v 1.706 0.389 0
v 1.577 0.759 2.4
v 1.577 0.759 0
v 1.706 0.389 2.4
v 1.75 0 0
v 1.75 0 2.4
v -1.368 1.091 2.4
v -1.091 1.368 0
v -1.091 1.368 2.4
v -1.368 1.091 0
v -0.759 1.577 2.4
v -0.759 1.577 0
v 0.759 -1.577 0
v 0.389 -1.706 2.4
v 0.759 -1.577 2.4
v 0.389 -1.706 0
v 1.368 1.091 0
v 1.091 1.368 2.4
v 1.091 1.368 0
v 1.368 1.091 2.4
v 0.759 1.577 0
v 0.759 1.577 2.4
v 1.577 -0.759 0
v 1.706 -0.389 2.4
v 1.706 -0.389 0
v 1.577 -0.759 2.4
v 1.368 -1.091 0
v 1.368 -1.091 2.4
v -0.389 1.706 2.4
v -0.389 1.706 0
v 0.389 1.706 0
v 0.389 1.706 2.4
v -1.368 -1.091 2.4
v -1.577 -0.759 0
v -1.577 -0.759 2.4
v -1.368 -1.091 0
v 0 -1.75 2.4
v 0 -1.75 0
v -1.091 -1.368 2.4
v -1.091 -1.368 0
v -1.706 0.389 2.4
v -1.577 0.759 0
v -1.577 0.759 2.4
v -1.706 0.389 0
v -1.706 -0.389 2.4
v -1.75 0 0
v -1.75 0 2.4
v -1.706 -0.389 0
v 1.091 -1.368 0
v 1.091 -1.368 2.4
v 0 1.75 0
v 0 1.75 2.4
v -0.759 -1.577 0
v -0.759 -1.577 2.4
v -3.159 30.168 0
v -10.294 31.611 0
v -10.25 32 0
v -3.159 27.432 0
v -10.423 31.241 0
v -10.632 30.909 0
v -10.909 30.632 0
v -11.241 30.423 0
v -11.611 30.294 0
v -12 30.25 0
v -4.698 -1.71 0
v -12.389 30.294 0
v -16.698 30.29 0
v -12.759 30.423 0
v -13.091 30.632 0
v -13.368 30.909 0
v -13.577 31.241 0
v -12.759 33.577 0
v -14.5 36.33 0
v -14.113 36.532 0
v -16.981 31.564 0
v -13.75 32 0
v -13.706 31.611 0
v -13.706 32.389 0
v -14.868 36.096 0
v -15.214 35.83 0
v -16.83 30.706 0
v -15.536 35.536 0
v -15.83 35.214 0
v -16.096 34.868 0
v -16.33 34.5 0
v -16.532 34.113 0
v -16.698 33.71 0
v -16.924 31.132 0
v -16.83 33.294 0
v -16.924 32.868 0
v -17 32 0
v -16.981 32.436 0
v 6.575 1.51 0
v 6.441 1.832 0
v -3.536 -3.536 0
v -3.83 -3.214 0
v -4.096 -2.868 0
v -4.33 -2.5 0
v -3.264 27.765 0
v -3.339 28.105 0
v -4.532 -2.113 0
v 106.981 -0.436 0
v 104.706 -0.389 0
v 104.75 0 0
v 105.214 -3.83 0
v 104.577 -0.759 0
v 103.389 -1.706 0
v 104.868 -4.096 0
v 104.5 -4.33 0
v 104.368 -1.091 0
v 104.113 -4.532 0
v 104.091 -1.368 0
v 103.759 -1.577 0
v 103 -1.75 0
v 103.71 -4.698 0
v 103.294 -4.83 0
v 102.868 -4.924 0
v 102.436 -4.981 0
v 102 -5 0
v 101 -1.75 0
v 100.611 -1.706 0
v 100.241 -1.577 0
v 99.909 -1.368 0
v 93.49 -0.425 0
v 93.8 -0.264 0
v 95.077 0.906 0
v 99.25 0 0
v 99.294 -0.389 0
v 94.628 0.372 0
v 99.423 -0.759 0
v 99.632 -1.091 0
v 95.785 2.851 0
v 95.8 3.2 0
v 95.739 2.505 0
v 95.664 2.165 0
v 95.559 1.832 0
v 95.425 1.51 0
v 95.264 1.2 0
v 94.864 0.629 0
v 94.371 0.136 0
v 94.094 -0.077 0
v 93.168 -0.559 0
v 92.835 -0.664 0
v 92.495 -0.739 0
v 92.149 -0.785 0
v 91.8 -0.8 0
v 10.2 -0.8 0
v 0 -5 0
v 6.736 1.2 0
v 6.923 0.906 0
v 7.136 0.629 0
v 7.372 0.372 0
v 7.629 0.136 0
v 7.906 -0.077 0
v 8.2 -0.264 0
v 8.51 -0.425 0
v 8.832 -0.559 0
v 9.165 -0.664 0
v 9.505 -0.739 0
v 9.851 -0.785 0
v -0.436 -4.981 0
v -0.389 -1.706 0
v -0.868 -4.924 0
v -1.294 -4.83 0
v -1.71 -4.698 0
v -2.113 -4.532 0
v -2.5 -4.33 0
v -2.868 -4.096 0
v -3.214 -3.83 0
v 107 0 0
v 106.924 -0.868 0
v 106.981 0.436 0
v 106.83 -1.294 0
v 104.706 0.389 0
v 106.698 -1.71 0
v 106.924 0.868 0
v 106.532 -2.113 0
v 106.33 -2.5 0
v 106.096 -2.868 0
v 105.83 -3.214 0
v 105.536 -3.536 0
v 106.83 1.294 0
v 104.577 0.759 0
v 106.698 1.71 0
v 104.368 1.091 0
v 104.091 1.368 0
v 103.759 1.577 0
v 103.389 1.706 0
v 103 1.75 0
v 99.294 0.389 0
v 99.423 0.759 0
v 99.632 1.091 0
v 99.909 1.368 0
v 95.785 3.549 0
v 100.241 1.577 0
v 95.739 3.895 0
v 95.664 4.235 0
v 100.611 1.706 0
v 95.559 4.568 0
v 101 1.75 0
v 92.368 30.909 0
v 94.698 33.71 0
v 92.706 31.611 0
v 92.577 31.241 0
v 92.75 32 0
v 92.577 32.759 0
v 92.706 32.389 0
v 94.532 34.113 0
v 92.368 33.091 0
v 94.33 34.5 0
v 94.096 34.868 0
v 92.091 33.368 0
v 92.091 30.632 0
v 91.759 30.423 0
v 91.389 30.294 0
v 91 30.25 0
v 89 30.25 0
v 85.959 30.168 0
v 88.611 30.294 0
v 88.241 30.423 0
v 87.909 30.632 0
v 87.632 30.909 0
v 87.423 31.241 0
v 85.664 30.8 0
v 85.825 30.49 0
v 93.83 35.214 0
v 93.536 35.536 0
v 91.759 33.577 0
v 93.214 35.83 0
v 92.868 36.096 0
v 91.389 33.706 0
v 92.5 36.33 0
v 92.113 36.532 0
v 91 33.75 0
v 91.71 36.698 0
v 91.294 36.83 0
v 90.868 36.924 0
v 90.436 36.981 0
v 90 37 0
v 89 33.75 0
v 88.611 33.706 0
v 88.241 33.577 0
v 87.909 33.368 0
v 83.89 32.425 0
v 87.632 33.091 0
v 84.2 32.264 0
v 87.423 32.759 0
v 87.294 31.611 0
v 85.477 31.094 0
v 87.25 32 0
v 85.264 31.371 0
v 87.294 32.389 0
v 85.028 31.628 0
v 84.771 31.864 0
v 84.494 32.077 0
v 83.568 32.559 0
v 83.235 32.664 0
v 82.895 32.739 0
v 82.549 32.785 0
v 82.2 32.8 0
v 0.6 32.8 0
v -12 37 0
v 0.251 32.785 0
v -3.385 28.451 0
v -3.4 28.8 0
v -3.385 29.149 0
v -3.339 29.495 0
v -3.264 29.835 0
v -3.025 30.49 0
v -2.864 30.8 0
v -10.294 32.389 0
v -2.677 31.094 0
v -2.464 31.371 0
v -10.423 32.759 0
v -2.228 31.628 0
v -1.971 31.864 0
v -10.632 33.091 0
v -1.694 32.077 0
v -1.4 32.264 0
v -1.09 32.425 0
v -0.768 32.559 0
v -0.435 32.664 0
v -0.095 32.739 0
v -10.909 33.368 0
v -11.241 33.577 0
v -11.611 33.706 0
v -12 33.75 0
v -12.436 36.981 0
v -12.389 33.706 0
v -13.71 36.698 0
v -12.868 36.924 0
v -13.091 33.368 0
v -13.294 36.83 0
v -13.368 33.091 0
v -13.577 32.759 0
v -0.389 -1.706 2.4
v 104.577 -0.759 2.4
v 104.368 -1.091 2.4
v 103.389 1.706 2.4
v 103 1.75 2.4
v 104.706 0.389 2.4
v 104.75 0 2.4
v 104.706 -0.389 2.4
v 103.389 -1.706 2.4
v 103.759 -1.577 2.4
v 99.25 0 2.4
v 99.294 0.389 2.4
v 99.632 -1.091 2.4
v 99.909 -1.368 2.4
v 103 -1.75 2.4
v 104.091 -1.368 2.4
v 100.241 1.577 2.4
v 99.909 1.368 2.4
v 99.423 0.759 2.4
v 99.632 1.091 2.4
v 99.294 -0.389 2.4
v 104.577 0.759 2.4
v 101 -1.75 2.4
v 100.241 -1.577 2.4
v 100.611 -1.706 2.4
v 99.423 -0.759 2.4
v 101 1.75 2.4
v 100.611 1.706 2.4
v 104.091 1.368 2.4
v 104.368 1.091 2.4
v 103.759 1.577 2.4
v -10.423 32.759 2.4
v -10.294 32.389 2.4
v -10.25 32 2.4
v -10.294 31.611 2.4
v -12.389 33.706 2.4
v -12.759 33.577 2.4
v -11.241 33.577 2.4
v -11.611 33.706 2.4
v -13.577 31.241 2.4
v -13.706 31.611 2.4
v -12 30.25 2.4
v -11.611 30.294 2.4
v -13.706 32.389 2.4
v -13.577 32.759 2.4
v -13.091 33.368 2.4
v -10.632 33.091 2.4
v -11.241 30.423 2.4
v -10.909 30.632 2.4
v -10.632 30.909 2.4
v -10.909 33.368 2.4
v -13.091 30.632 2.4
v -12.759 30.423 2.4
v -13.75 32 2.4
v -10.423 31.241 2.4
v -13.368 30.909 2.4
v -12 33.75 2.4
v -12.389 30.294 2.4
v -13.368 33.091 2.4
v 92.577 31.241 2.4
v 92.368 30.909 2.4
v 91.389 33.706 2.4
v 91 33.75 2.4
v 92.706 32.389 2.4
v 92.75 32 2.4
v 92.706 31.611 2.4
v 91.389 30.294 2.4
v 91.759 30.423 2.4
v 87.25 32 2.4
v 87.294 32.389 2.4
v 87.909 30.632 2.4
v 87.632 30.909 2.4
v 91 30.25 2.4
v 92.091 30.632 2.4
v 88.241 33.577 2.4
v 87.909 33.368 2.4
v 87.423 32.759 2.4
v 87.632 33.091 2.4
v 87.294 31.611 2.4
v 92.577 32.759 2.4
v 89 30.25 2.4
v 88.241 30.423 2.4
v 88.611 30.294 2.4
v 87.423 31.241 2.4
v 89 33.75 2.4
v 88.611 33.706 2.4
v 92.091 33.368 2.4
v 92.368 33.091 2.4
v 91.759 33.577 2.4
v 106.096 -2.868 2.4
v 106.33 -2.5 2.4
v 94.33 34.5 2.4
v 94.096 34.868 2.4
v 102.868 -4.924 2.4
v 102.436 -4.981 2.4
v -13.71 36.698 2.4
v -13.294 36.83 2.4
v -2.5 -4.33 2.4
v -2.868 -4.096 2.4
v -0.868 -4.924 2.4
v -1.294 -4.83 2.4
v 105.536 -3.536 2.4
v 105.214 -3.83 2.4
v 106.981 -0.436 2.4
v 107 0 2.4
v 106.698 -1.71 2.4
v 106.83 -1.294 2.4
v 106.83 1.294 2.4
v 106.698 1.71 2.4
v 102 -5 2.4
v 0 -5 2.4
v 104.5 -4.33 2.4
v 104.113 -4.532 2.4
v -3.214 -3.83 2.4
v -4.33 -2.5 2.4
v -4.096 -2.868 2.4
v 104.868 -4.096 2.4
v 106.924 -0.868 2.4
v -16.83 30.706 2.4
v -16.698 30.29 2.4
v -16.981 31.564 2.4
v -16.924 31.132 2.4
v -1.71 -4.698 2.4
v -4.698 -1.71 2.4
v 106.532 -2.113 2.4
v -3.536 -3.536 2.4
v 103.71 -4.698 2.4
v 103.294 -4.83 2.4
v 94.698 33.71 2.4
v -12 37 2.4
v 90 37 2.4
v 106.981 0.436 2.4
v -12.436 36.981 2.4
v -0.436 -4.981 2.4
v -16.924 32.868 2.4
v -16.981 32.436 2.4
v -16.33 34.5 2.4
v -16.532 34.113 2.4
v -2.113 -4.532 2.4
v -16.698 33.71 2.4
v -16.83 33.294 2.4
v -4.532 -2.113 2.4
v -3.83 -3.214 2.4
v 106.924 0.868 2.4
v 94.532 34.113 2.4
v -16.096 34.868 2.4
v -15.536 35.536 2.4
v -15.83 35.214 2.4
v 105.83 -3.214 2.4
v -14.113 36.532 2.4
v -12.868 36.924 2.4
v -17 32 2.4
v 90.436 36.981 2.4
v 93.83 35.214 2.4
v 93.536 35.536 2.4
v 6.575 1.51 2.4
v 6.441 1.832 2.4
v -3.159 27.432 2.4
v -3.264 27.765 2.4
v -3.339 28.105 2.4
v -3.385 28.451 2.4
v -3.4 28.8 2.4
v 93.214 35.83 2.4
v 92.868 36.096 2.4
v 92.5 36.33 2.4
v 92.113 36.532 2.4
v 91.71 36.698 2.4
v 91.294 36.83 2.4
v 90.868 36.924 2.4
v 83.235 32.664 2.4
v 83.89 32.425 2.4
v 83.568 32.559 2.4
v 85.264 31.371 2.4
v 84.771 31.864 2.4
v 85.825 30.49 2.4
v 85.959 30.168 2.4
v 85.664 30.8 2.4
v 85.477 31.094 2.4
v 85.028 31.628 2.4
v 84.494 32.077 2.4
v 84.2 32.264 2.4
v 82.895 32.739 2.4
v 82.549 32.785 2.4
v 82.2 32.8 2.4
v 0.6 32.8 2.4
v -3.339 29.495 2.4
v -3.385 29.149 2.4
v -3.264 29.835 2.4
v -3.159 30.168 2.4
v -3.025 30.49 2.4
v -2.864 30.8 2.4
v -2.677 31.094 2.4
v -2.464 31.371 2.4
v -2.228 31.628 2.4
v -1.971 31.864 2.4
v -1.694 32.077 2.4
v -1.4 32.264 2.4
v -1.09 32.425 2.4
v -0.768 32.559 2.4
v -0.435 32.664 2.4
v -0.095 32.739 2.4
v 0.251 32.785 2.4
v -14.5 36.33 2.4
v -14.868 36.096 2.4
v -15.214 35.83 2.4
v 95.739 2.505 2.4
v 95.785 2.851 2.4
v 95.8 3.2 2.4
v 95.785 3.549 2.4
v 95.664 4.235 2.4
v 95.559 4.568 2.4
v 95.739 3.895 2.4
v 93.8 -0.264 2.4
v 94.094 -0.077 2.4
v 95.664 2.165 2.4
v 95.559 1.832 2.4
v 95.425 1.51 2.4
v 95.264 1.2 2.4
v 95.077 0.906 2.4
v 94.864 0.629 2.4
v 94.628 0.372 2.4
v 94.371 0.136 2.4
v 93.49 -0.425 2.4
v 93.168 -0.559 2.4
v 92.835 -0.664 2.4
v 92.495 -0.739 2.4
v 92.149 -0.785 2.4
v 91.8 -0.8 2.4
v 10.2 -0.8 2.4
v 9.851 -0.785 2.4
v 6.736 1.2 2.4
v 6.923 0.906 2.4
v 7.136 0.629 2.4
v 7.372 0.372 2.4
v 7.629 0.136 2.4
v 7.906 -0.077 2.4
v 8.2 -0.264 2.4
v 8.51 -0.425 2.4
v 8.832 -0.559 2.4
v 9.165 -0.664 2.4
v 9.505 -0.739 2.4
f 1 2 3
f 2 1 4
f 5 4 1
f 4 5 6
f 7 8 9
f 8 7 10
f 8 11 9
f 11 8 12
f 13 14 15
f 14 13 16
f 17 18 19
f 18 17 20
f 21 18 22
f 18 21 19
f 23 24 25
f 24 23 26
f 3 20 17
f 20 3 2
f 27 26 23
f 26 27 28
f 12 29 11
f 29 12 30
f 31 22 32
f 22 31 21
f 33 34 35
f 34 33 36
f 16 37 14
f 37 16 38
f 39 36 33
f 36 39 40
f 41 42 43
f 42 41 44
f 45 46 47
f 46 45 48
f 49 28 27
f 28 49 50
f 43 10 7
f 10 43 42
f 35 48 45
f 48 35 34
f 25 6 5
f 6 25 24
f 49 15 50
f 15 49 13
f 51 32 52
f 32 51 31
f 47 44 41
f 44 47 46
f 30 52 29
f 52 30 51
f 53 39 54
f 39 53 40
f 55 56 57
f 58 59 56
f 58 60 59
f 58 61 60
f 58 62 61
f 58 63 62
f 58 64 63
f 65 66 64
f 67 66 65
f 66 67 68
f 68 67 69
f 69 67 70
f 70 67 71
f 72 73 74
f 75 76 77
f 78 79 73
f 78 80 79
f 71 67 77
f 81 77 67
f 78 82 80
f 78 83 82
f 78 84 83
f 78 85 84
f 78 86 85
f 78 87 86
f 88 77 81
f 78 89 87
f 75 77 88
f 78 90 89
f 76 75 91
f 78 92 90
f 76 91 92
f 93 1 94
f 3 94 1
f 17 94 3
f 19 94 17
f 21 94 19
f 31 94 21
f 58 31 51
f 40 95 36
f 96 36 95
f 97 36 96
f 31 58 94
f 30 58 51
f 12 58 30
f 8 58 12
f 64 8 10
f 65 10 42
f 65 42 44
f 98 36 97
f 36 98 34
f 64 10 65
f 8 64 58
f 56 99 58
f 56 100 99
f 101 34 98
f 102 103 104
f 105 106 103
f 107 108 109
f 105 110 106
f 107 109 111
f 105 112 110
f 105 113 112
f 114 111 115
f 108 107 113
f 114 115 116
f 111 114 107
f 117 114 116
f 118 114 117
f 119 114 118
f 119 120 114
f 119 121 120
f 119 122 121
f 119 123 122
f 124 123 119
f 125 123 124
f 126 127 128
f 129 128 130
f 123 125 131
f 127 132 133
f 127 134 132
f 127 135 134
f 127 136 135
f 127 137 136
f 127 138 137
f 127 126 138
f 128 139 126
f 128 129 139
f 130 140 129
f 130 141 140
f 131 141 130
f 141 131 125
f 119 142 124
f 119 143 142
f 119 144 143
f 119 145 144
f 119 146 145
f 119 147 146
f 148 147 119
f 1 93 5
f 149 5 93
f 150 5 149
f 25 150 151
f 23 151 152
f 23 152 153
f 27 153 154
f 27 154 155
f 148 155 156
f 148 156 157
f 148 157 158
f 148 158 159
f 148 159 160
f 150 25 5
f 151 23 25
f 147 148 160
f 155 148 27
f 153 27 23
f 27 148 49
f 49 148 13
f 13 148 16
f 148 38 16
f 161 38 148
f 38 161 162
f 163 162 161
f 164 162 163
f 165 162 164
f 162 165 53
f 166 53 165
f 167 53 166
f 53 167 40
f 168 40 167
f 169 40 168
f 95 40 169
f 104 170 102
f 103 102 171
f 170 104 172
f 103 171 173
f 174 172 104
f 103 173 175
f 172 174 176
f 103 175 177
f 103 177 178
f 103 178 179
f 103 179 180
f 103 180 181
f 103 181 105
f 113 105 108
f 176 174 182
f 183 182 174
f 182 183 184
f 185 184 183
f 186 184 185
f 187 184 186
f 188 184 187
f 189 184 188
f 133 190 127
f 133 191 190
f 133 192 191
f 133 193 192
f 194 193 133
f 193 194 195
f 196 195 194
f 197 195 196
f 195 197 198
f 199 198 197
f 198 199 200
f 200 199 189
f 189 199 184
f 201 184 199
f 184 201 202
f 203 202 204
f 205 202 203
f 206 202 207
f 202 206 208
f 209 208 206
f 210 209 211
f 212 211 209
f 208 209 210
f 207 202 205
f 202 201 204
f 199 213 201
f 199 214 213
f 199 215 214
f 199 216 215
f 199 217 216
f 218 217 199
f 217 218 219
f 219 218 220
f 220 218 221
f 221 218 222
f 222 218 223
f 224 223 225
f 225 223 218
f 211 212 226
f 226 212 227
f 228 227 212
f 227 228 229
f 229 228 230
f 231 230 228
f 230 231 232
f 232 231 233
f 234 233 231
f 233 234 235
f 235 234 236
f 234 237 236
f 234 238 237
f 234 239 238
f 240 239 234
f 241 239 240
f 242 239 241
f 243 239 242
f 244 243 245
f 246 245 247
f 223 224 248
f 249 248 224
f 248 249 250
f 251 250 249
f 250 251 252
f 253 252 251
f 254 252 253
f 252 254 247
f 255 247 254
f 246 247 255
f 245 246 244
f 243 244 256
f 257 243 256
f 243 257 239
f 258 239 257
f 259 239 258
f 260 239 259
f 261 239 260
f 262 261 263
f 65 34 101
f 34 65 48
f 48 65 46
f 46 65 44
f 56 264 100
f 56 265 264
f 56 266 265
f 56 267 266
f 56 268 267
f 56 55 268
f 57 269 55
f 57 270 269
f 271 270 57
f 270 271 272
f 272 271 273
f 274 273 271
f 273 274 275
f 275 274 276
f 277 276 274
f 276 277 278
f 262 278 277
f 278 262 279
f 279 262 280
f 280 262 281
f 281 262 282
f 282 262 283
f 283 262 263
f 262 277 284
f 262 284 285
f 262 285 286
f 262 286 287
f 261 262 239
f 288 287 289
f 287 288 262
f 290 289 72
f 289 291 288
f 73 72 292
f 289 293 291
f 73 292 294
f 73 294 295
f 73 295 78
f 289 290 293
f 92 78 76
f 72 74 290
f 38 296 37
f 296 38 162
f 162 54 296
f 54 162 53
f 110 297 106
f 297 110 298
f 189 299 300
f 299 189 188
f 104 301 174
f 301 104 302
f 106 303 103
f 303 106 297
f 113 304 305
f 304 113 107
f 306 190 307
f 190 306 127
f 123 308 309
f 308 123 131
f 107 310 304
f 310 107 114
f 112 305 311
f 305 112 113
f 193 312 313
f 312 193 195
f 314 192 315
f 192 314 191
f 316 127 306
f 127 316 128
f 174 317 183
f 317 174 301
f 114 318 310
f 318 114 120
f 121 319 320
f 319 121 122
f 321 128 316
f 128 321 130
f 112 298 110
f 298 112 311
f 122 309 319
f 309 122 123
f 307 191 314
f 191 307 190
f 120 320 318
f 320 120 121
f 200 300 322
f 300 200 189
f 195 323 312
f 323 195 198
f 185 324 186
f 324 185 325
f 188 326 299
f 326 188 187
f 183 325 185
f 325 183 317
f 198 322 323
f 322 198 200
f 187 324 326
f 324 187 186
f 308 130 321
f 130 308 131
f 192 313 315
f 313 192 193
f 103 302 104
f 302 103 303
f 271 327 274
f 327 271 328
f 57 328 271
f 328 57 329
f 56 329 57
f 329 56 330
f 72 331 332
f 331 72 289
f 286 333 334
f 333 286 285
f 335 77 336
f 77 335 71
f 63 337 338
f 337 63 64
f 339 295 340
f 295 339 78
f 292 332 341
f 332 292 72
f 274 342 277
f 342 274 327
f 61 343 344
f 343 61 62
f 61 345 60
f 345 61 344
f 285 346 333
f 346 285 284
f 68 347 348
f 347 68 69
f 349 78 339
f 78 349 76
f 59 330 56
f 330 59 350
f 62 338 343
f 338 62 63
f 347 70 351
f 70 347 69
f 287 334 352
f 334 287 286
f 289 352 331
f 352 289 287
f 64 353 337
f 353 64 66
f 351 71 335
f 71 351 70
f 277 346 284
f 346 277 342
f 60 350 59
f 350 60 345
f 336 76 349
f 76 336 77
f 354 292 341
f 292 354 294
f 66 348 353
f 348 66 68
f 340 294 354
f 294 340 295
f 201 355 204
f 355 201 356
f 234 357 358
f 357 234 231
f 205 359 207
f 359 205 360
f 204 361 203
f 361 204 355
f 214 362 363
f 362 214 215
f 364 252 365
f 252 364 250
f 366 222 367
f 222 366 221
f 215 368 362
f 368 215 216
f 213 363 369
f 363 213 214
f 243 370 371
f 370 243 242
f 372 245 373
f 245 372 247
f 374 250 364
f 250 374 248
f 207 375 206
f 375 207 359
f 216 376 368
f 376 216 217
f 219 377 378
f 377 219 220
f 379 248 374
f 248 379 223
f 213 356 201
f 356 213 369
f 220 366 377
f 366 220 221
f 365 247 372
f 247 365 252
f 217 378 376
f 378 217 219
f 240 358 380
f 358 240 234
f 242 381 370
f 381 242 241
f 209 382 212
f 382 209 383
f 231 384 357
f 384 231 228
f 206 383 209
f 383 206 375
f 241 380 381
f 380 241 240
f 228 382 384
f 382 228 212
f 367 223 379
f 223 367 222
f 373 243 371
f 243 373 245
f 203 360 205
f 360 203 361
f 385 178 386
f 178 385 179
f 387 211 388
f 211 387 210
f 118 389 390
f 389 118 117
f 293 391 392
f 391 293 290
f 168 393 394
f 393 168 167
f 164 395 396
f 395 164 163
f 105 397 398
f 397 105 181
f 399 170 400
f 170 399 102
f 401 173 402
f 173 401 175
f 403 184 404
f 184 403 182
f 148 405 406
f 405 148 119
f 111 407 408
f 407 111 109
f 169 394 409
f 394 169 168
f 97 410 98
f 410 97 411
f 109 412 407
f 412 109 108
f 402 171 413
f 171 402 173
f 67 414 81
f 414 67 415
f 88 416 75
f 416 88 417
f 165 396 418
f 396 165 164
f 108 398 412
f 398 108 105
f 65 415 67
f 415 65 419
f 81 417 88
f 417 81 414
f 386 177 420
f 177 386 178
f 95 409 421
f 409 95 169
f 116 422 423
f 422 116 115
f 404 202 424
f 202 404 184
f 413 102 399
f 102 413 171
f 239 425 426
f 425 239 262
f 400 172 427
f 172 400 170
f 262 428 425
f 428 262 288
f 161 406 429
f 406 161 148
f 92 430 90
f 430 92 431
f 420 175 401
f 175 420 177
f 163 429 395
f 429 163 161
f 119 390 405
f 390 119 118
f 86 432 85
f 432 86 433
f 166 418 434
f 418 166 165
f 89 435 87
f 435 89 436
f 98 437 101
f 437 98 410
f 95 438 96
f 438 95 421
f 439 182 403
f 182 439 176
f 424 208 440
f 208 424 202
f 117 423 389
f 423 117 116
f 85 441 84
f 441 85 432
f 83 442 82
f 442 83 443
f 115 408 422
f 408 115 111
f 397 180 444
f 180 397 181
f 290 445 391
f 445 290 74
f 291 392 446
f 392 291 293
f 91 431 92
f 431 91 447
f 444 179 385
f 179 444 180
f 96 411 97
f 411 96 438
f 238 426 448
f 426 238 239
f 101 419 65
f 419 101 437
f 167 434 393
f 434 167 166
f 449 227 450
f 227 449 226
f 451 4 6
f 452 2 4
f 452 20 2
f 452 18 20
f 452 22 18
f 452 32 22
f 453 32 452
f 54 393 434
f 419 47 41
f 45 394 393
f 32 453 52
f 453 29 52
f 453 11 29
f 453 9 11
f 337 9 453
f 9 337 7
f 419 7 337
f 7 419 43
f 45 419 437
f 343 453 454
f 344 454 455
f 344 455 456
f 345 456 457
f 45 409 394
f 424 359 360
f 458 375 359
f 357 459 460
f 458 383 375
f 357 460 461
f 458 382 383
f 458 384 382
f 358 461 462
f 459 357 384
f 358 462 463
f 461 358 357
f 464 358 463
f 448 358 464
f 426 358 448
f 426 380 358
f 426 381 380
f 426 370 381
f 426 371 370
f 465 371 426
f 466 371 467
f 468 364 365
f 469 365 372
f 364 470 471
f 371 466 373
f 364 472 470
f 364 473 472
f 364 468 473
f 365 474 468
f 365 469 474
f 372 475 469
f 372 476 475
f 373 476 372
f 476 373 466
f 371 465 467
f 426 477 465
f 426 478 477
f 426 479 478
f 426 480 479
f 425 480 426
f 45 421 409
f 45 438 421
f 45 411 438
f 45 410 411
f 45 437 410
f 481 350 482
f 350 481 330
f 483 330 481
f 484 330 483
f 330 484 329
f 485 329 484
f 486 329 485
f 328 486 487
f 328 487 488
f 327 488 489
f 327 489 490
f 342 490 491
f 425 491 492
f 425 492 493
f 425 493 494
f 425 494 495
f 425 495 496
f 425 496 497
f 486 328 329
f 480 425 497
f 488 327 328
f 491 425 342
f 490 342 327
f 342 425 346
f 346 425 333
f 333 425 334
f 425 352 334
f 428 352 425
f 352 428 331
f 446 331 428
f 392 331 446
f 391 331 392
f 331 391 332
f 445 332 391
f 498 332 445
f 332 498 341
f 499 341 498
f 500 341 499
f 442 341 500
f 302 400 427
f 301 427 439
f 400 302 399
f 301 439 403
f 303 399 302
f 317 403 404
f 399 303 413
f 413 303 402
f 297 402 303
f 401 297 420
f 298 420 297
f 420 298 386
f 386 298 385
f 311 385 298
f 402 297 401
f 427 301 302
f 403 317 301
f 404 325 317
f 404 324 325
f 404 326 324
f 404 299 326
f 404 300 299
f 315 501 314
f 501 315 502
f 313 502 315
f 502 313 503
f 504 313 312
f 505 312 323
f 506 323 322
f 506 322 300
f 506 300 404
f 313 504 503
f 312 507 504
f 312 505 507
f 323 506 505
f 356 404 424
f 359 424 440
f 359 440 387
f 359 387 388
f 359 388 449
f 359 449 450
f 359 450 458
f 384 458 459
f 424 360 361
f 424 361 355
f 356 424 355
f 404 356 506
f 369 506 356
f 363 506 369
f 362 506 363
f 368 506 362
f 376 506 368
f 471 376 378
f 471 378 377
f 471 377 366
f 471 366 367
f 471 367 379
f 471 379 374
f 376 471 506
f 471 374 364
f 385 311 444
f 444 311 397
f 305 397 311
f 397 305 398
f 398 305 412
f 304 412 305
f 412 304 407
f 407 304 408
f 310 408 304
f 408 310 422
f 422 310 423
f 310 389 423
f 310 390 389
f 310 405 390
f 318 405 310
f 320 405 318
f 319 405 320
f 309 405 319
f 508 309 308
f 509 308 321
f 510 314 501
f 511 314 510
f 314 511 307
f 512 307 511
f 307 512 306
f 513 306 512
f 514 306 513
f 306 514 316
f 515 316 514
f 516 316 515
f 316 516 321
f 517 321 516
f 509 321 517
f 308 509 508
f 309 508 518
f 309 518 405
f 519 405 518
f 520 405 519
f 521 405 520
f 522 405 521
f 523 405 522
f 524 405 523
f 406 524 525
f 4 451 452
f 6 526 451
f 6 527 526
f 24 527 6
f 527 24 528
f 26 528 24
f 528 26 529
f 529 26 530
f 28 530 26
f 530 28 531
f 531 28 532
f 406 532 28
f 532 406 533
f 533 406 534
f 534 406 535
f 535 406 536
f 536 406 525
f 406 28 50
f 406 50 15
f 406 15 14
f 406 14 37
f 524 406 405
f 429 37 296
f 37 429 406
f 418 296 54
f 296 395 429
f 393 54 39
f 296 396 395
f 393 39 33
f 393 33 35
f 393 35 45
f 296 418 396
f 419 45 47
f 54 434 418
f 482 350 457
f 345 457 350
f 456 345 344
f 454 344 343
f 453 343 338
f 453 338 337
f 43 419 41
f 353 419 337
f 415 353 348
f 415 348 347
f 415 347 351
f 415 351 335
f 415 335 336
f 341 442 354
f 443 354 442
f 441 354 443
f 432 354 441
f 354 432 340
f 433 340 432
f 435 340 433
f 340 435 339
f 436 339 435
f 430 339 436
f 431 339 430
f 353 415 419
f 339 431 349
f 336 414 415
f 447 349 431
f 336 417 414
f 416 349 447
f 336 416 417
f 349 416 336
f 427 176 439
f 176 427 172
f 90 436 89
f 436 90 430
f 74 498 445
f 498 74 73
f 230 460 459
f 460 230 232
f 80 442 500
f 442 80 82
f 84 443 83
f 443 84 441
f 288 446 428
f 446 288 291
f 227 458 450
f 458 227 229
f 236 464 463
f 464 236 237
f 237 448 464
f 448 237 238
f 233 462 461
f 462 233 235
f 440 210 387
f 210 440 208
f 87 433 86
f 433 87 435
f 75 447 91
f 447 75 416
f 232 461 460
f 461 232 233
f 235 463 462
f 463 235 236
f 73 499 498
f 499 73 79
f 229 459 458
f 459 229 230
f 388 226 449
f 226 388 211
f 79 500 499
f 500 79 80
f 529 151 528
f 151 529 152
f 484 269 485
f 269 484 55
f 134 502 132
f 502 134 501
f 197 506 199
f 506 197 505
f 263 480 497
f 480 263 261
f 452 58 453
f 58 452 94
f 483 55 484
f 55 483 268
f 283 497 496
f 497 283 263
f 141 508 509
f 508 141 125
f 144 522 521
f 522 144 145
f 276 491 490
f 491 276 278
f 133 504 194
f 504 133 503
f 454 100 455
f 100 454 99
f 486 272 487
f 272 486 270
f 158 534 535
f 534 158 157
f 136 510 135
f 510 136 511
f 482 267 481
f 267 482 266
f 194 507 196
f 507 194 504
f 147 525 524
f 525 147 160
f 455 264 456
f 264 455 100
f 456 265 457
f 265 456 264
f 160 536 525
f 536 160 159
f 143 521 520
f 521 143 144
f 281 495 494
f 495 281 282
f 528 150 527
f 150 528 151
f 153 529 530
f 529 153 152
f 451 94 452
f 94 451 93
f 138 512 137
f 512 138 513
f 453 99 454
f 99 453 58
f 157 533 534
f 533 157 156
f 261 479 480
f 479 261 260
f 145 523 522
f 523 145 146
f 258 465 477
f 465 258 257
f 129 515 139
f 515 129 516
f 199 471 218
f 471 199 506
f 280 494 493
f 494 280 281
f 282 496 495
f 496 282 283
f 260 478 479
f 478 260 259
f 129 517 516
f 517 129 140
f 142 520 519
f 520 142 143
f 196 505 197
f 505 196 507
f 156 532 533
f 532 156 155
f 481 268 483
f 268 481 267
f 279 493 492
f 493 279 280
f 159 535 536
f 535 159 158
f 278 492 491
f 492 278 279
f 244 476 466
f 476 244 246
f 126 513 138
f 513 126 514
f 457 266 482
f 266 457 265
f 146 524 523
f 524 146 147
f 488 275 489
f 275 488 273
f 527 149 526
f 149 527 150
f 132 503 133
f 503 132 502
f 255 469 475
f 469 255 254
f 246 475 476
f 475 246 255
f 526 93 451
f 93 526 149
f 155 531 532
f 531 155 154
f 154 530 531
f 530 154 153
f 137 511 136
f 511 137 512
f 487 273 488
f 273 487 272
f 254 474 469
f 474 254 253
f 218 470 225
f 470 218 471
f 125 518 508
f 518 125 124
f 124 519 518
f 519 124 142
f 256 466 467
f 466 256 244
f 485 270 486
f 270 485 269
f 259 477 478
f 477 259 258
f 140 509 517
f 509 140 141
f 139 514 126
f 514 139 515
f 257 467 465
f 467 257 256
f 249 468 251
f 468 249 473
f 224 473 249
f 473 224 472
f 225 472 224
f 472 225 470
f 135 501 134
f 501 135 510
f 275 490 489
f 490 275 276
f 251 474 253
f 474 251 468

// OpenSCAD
//$fn=60;
$fa=5;
$fs=.4;

holes_x_dist = 102;
holes_y_dist = 32;
holes_x_offset = -12;
h1x = 0;                                h1y = 0;
h2x = holes_x_dist;                     h2y = 0;
h3x = holes_x_offset;                   h3y = holes_y_dist;
h4x = holes_x_dist + holes_x_offset;    h4y = holes_y_dist;

mount_hole_dia = 3.5;
mount_hole_tolerance = 2;
mount_hole_height = 6;

difference(){
    basic_shape();
    mount_holes();
    inner_hole();
}

module basic_shape(shape_height = 2.4){
    shape_dia = 10;
    hull(){
        translate([h1x,h1y,0]) cylinder(d=shape_dia,h=shape_height);
        translate([h2x,h2y,0]) cylinder(d=shape_dia,h=shape_height);
        translate([h3x,h3y,0]) cylinder(d=shape_dia,h=shape_height);
        translate([h4x,h4y,0]) cylinder(d=shape_dia,h=shape_height);
    }
}

module inner_hole(){
    hole_x_scale = 0.8;
    hole_y_scale = 0.8;
    translate([holes_x_dist * (1-hole_x_scale)/2, holes_y_dist * (1-hole_y_scale)/2,0]){
        scale([hole_x_scale,hole_y_scale,1]) basic_shape(4);
    }
}

module mount_holes(){
    translate([h1x,h1y,0]) mount_hole_round();
    translate([h2x,h2y,0]) mount_hole_oval();
    translate([h3x,h3y,0]) mount_hole_round();
    translate([h4x,h4y,0]) mount_hole_oval();
}

module mount_hole_round(){
    cylinder(d=mount_hole_dia,h=mount_hole_height);
}

module mount_hole_oval(){
    hull(){
        translate([-mount_hole_tolerance/2,0,0]) cylinder(d=mount_hole_dia,h=mount_hole_height);
        translate([mount_hole_tolerance/2,0,0]) cylinder(d=mount_hole_dia,h=mount_hole_height);    
    }
}
